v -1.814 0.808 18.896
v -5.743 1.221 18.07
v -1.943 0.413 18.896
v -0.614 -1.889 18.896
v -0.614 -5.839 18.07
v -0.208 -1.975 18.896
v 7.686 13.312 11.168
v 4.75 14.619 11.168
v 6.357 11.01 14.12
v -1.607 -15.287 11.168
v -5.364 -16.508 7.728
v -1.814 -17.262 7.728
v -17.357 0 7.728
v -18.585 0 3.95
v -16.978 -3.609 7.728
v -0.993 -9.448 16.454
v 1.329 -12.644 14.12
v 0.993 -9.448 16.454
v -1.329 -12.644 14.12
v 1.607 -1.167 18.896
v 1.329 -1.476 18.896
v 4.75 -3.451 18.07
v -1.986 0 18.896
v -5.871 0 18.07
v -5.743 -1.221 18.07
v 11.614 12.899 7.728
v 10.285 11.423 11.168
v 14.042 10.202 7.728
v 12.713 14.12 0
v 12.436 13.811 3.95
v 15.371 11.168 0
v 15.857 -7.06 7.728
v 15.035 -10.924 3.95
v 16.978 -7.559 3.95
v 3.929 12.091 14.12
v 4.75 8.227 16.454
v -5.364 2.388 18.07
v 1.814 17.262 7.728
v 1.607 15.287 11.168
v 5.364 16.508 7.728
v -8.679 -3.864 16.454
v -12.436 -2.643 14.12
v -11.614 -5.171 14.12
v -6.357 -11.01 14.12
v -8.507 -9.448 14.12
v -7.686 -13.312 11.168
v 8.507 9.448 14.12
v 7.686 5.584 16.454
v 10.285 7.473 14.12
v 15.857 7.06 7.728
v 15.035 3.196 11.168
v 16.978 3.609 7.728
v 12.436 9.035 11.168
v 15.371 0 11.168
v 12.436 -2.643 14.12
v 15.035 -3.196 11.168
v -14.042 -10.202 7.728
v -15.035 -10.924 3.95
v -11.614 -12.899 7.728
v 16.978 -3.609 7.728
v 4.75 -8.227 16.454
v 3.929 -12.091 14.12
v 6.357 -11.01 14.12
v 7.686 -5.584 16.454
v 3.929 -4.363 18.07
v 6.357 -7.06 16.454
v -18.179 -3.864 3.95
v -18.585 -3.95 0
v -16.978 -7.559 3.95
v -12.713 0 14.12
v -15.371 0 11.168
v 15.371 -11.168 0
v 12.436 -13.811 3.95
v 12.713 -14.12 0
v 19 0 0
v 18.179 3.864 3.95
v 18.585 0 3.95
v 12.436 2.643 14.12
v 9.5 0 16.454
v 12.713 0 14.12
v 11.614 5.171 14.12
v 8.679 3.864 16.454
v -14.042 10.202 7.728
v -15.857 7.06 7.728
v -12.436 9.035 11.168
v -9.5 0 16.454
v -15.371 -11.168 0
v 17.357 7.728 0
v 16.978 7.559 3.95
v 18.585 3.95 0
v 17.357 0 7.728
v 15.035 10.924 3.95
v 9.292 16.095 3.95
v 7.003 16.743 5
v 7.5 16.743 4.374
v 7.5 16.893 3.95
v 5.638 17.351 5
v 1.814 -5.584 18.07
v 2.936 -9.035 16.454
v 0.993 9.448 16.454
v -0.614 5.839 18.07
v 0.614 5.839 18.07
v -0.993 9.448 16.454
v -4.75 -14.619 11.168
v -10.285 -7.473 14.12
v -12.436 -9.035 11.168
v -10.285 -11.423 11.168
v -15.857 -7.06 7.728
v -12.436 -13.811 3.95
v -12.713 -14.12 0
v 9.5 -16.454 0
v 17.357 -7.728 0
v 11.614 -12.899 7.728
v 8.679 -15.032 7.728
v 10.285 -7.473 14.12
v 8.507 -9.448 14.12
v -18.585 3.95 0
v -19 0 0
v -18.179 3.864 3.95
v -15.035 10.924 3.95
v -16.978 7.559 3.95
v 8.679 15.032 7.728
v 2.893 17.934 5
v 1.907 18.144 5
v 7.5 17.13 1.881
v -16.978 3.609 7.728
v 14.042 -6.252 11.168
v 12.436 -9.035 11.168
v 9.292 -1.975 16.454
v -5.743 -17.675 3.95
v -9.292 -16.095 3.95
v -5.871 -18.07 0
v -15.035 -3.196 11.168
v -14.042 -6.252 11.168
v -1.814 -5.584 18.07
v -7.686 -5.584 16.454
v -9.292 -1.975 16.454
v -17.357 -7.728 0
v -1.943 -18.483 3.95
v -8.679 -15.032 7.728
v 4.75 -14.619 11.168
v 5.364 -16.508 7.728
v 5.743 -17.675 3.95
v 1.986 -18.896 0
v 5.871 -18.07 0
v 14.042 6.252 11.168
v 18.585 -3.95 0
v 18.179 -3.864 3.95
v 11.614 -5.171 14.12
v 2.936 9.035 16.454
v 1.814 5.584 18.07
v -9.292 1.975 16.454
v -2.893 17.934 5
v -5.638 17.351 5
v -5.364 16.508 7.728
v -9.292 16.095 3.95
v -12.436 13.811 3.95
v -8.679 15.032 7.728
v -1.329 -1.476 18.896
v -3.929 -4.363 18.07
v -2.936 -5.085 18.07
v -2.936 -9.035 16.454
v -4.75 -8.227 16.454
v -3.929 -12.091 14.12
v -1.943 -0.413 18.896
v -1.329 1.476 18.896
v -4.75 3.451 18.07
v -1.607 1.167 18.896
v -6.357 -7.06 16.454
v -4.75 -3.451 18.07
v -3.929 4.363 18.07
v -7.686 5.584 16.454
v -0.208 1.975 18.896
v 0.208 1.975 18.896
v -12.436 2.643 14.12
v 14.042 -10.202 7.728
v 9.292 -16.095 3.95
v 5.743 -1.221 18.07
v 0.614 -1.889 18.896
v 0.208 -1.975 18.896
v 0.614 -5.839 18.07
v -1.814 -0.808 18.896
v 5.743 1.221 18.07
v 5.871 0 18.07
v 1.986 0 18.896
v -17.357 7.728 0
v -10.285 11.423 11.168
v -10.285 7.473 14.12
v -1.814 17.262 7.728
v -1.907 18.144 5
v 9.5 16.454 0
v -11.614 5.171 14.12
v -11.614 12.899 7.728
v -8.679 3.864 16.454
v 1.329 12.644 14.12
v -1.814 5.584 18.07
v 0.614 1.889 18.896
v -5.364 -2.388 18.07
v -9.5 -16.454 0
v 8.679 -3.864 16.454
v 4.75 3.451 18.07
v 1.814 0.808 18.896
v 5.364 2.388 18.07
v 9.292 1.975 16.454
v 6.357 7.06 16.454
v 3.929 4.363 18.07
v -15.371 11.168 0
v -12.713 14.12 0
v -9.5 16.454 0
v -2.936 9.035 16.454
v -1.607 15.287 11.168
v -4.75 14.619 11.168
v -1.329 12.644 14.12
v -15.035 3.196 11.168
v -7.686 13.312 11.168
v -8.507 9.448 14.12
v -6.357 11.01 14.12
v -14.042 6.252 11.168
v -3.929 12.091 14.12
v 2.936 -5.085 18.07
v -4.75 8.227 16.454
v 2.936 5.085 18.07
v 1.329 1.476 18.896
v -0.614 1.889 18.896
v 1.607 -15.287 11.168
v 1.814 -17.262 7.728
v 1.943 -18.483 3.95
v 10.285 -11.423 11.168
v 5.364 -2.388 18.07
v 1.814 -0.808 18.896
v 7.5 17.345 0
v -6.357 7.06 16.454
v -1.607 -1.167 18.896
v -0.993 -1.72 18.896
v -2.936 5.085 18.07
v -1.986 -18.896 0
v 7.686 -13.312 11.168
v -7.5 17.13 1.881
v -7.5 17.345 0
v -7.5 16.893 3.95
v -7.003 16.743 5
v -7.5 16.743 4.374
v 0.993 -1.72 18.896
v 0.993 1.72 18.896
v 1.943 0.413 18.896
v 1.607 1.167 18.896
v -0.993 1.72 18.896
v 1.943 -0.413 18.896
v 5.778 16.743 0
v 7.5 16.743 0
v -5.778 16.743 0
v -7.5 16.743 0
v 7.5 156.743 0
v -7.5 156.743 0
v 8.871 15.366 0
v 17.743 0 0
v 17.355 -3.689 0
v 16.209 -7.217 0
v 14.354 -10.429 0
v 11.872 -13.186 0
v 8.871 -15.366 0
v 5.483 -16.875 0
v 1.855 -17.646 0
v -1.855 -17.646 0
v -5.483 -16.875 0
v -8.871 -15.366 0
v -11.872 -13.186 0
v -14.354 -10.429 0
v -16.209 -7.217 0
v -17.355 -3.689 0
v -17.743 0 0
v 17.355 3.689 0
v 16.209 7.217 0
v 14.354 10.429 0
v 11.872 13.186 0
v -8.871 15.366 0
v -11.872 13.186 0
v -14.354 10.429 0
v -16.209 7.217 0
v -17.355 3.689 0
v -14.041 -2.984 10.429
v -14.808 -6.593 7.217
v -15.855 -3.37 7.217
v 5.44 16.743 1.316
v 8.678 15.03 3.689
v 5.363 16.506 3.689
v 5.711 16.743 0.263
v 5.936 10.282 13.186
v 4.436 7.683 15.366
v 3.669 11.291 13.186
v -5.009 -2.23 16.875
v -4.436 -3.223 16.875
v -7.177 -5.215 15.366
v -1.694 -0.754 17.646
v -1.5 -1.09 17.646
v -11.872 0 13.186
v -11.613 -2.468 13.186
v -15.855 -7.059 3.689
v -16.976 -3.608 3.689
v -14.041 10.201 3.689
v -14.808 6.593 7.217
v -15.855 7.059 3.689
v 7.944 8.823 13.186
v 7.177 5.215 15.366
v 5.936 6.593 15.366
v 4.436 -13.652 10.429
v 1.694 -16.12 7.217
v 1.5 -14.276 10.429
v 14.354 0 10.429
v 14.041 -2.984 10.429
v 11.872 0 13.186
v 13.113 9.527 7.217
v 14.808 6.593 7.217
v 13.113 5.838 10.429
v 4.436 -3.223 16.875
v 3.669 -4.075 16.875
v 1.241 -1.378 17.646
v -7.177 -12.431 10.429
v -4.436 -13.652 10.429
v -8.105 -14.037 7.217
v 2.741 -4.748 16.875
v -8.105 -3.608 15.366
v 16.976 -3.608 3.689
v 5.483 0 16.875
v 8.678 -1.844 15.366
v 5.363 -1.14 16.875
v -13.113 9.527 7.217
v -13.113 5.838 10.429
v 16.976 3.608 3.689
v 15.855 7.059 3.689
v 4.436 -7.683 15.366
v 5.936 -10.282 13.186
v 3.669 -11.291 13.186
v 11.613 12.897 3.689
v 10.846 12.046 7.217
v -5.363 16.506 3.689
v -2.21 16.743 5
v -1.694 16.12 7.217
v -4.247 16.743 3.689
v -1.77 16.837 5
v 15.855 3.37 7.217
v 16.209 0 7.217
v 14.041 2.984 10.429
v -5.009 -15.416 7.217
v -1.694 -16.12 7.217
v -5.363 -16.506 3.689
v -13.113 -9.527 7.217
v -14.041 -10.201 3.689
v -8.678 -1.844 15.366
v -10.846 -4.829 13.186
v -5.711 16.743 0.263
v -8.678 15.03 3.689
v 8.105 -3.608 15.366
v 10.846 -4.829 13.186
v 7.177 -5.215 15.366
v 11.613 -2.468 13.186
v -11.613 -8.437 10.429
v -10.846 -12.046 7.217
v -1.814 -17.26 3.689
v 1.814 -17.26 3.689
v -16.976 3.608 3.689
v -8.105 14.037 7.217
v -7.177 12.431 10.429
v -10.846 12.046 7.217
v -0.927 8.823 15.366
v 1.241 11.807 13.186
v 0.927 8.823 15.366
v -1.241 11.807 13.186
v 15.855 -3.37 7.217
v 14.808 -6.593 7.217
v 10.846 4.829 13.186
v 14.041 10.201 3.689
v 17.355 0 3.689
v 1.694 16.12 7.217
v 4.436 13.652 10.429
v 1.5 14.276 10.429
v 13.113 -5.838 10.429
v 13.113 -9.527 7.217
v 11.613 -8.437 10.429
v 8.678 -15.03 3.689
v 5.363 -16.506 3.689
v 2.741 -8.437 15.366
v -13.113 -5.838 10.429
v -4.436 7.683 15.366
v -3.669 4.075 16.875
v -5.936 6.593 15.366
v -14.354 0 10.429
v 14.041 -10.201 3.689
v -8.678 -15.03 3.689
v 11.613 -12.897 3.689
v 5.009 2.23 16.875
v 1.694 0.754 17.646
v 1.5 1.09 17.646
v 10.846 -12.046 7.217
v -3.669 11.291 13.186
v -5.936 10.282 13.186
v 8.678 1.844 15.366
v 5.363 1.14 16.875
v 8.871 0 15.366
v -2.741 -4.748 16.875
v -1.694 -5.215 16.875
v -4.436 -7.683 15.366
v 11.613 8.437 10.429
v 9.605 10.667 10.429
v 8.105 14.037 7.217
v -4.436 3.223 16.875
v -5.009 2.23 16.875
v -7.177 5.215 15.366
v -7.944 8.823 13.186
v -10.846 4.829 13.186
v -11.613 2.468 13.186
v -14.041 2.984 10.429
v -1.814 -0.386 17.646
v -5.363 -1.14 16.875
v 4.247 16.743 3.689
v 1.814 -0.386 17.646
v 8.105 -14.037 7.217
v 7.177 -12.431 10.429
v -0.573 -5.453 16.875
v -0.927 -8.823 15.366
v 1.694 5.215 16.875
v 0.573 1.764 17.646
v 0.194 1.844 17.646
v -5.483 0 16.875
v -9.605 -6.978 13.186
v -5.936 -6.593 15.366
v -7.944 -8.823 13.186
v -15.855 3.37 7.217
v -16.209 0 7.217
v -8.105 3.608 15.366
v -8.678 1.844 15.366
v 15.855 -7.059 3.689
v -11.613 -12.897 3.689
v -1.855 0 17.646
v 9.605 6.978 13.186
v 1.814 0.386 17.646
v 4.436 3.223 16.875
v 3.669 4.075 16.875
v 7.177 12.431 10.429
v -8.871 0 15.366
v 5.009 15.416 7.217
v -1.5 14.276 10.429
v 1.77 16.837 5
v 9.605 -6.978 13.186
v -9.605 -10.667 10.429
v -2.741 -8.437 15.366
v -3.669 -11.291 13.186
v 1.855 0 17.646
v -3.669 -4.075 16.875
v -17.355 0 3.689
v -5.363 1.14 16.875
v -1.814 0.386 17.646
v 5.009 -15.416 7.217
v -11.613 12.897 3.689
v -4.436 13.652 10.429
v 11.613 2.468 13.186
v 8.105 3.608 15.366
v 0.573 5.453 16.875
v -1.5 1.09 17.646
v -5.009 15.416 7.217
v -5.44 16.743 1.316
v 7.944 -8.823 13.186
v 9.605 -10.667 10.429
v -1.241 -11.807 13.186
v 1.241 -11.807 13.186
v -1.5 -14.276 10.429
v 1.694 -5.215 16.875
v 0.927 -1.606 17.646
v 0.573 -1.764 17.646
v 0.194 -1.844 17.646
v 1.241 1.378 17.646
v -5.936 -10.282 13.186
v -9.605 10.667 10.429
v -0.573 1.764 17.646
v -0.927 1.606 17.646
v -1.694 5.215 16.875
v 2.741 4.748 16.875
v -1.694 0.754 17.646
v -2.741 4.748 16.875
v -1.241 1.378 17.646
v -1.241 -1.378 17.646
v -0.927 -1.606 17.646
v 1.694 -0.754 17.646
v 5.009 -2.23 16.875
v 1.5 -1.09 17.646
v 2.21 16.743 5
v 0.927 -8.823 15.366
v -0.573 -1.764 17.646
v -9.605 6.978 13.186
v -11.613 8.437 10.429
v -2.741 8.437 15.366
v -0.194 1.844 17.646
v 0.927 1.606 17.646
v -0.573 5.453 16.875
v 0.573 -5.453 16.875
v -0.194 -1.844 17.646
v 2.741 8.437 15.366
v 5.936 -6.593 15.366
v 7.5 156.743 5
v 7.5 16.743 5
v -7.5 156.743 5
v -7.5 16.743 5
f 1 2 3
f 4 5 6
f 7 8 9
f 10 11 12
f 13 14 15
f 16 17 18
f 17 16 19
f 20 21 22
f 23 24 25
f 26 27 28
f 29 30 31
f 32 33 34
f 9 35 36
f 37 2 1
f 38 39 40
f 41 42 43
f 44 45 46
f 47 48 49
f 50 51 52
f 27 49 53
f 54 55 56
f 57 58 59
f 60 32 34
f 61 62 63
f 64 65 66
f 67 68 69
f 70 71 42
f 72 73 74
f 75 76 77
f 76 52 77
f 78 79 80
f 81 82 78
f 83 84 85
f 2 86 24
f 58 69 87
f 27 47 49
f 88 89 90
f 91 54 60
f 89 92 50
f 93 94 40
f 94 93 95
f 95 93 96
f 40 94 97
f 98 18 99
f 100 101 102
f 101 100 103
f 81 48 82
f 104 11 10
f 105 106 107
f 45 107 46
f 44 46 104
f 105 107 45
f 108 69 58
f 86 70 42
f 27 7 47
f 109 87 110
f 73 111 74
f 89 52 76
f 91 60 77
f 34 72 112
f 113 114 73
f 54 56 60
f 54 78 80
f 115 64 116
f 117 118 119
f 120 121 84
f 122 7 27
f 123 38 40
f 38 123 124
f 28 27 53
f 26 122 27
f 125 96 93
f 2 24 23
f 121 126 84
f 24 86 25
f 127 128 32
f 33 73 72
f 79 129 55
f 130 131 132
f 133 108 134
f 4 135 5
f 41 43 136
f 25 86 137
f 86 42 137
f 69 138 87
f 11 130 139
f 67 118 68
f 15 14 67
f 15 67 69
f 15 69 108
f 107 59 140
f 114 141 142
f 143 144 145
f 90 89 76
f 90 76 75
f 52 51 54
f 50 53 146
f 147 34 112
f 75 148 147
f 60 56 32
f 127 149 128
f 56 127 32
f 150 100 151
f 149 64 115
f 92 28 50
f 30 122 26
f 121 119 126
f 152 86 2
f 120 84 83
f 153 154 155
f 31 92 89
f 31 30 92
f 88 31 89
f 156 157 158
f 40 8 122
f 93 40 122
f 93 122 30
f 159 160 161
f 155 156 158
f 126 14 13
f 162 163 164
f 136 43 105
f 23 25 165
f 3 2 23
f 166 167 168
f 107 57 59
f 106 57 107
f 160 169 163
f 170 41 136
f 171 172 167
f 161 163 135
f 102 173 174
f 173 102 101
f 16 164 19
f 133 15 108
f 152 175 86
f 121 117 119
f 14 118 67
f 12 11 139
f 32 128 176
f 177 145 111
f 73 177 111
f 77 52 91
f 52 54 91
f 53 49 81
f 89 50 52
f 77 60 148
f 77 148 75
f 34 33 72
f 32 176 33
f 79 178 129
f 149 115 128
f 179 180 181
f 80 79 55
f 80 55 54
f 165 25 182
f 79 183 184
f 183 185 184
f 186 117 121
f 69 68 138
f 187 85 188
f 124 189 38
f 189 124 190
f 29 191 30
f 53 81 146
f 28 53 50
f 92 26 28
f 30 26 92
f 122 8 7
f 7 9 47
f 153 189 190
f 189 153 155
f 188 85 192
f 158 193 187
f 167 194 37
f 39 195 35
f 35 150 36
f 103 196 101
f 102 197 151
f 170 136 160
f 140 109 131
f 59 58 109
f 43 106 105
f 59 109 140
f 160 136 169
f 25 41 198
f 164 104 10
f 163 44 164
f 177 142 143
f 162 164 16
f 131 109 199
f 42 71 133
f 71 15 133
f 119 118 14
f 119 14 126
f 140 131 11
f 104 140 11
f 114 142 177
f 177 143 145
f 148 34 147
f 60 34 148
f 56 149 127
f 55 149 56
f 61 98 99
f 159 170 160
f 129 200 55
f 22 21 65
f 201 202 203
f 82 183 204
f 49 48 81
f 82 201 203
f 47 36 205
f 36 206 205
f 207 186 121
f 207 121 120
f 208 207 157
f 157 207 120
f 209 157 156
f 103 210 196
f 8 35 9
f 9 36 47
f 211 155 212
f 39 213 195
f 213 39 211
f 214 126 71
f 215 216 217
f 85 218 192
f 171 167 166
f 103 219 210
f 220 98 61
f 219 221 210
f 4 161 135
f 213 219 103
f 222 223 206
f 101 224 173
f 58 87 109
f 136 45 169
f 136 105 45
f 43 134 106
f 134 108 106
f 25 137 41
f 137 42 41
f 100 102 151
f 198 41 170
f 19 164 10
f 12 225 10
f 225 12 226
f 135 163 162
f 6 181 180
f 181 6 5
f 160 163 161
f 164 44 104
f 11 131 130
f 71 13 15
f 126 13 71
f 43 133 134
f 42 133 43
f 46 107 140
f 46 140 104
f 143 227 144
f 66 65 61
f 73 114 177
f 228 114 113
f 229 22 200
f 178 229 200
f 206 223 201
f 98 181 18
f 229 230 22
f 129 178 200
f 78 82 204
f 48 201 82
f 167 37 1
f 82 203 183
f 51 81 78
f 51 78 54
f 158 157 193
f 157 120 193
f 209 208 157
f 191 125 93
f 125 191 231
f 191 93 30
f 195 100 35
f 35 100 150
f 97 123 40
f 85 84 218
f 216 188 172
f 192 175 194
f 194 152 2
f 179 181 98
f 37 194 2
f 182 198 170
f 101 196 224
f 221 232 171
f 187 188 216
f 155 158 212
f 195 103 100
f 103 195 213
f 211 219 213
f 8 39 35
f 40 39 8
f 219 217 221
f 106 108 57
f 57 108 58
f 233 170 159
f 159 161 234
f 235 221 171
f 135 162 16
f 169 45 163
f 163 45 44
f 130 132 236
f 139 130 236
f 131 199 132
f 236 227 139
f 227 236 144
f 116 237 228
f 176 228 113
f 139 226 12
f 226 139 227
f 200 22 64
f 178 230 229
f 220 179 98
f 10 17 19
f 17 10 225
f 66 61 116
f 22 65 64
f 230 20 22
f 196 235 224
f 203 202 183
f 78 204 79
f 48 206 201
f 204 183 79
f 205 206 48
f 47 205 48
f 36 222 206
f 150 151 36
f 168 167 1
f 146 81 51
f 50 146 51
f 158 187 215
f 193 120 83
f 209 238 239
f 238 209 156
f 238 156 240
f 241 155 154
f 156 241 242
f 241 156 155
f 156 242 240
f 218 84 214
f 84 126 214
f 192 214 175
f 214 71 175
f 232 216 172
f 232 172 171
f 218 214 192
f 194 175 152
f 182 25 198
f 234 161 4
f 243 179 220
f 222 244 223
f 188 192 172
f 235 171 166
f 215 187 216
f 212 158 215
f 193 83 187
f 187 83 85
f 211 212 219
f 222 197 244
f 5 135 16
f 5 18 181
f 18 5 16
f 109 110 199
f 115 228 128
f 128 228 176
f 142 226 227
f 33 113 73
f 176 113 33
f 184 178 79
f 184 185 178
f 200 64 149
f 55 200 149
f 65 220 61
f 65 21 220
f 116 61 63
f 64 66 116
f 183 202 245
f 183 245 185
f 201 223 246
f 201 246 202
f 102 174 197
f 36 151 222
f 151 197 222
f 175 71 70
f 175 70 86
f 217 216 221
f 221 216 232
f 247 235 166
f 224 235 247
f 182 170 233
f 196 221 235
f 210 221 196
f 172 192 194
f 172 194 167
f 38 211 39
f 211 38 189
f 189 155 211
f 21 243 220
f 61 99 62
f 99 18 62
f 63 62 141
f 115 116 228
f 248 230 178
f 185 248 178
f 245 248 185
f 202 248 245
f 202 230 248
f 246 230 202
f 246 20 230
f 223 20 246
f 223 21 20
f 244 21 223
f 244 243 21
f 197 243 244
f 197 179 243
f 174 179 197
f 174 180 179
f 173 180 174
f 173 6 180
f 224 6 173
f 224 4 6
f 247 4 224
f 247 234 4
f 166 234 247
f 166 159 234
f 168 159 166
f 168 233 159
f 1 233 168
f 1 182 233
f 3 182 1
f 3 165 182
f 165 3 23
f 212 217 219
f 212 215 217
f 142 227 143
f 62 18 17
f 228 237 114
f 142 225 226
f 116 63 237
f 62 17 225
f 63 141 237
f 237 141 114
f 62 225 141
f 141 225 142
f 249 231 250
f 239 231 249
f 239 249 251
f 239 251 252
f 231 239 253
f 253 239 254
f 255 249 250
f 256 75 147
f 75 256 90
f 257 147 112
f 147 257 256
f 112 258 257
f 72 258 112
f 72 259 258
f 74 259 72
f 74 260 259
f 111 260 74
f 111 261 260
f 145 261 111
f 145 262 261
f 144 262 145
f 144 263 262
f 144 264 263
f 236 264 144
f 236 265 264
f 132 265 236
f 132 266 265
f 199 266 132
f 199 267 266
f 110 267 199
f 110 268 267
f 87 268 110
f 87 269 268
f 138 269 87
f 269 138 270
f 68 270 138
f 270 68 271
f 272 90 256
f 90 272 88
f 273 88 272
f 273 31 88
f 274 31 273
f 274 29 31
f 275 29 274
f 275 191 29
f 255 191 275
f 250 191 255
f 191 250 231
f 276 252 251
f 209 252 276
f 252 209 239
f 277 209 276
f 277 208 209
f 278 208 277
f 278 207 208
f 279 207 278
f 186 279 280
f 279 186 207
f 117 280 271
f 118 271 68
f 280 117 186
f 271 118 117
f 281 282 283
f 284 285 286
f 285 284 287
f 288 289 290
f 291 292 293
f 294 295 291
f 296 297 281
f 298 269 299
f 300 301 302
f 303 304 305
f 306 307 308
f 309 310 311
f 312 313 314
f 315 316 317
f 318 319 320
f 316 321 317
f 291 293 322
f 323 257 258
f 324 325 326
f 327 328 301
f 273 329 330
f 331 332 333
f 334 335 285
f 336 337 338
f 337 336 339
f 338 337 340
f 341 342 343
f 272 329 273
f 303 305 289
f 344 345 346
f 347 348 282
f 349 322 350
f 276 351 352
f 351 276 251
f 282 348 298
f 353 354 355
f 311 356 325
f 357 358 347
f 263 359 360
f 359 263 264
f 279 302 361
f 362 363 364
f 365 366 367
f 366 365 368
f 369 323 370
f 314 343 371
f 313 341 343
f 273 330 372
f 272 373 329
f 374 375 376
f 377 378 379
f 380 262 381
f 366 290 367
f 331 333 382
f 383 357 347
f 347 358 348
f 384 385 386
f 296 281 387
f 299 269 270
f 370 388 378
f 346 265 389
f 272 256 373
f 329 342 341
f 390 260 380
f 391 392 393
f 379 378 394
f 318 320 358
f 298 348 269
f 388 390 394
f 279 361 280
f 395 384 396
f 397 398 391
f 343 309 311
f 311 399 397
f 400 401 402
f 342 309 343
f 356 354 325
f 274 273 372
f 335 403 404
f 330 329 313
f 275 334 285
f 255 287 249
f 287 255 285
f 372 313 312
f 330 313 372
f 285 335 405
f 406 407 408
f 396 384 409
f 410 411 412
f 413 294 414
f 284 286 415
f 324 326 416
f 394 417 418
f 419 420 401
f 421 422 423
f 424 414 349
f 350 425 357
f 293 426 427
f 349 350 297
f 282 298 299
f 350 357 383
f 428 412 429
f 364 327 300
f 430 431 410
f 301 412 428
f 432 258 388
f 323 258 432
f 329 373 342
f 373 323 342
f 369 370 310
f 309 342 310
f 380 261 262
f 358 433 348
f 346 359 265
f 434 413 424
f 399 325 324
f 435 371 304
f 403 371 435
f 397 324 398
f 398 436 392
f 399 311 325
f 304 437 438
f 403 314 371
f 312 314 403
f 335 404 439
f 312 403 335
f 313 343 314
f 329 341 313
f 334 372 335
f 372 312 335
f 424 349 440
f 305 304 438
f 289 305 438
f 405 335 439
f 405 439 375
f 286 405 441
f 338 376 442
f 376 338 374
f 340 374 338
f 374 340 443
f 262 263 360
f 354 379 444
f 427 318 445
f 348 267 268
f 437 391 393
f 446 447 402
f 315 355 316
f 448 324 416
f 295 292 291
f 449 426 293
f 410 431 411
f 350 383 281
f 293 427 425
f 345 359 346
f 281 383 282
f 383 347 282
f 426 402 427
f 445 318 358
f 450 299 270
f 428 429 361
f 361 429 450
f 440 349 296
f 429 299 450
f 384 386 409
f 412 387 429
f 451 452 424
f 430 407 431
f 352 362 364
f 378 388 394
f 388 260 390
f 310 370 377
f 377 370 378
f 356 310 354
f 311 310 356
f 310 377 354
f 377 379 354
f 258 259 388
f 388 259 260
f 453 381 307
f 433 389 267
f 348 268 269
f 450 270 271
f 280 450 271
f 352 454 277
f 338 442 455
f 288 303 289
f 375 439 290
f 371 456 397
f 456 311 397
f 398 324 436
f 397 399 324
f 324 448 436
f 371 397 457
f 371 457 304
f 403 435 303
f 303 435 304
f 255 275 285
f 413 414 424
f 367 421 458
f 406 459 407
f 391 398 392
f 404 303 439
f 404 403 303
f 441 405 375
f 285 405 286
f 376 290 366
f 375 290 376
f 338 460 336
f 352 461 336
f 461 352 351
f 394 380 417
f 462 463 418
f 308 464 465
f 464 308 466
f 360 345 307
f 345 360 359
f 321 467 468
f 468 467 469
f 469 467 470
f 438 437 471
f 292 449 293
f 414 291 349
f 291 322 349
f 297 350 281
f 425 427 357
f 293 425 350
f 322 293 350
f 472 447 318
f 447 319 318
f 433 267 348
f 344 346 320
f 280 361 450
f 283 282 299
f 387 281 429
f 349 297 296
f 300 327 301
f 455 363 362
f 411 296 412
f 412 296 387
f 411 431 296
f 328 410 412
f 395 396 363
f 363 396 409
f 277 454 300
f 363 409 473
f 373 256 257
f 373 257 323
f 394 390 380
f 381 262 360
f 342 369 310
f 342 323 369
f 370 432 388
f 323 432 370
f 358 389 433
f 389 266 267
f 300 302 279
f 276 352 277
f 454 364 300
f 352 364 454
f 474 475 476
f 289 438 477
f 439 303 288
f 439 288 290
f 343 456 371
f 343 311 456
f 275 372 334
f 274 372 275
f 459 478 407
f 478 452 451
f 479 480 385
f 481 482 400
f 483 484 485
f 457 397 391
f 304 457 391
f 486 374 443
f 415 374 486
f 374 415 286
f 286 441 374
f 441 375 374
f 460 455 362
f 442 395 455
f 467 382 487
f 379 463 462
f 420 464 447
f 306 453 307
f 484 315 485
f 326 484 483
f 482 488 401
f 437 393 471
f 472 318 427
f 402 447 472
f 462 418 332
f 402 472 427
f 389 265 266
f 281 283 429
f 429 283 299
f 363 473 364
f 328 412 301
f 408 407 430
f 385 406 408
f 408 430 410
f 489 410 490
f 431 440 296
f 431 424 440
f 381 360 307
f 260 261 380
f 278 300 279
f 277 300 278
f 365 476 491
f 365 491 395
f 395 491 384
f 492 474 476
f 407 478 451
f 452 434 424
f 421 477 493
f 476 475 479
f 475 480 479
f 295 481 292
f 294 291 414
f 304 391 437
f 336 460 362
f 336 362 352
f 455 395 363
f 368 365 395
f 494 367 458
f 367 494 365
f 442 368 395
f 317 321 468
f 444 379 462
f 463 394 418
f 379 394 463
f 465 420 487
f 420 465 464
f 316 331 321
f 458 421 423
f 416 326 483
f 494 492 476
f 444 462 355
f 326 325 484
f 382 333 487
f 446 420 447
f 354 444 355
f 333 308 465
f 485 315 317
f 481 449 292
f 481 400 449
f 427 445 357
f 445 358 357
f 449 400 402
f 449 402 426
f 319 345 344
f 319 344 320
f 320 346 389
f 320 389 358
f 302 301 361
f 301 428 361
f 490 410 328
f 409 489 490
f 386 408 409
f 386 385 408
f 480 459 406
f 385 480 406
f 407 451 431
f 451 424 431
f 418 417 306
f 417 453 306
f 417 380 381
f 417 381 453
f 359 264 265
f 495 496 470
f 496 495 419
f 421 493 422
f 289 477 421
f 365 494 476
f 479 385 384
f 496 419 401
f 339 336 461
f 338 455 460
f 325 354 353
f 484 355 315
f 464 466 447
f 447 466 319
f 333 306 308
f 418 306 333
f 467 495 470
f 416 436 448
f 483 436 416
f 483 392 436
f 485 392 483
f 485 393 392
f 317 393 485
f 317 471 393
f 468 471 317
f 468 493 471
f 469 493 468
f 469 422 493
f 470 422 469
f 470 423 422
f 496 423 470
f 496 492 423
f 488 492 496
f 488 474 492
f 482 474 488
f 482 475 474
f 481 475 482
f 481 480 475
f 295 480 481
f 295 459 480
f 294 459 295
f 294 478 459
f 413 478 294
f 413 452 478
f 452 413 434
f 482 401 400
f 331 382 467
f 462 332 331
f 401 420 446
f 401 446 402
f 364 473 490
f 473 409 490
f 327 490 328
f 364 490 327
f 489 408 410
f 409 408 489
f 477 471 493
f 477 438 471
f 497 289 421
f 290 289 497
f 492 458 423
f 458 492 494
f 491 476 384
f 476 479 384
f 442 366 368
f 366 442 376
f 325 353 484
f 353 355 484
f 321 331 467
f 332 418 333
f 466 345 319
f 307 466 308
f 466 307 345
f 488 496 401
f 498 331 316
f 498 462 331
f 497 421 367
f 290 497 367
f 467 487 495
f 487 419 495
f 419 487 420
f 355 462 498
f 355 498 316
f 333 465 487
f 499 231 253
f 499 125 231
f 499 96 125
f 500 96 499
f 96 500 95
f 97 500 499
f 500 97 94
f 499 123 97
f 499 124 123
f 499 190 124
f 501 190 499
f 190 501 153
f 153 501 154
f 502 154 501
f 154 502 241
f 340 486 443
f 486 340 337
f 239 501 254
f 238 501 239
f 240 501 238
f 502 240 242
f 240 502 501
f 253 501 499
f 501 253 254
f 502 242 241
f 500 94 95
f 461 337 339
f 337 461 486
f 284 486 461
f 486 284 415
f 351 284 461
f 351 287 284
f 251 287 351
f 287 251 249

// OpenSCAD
module halfSphere(r)
{
  difference()
  {
    sphere(r);
    d=r+1;
    translate([-d, -d, -d])
      cube([2*d, 2*d, d]);
  }
}


r=17.743;
difference()
{
  halfSphere(19);
  halfSphere(r);
}
translate([-15/2, +r-1, 0])
  cube([15, 140, 5]);
